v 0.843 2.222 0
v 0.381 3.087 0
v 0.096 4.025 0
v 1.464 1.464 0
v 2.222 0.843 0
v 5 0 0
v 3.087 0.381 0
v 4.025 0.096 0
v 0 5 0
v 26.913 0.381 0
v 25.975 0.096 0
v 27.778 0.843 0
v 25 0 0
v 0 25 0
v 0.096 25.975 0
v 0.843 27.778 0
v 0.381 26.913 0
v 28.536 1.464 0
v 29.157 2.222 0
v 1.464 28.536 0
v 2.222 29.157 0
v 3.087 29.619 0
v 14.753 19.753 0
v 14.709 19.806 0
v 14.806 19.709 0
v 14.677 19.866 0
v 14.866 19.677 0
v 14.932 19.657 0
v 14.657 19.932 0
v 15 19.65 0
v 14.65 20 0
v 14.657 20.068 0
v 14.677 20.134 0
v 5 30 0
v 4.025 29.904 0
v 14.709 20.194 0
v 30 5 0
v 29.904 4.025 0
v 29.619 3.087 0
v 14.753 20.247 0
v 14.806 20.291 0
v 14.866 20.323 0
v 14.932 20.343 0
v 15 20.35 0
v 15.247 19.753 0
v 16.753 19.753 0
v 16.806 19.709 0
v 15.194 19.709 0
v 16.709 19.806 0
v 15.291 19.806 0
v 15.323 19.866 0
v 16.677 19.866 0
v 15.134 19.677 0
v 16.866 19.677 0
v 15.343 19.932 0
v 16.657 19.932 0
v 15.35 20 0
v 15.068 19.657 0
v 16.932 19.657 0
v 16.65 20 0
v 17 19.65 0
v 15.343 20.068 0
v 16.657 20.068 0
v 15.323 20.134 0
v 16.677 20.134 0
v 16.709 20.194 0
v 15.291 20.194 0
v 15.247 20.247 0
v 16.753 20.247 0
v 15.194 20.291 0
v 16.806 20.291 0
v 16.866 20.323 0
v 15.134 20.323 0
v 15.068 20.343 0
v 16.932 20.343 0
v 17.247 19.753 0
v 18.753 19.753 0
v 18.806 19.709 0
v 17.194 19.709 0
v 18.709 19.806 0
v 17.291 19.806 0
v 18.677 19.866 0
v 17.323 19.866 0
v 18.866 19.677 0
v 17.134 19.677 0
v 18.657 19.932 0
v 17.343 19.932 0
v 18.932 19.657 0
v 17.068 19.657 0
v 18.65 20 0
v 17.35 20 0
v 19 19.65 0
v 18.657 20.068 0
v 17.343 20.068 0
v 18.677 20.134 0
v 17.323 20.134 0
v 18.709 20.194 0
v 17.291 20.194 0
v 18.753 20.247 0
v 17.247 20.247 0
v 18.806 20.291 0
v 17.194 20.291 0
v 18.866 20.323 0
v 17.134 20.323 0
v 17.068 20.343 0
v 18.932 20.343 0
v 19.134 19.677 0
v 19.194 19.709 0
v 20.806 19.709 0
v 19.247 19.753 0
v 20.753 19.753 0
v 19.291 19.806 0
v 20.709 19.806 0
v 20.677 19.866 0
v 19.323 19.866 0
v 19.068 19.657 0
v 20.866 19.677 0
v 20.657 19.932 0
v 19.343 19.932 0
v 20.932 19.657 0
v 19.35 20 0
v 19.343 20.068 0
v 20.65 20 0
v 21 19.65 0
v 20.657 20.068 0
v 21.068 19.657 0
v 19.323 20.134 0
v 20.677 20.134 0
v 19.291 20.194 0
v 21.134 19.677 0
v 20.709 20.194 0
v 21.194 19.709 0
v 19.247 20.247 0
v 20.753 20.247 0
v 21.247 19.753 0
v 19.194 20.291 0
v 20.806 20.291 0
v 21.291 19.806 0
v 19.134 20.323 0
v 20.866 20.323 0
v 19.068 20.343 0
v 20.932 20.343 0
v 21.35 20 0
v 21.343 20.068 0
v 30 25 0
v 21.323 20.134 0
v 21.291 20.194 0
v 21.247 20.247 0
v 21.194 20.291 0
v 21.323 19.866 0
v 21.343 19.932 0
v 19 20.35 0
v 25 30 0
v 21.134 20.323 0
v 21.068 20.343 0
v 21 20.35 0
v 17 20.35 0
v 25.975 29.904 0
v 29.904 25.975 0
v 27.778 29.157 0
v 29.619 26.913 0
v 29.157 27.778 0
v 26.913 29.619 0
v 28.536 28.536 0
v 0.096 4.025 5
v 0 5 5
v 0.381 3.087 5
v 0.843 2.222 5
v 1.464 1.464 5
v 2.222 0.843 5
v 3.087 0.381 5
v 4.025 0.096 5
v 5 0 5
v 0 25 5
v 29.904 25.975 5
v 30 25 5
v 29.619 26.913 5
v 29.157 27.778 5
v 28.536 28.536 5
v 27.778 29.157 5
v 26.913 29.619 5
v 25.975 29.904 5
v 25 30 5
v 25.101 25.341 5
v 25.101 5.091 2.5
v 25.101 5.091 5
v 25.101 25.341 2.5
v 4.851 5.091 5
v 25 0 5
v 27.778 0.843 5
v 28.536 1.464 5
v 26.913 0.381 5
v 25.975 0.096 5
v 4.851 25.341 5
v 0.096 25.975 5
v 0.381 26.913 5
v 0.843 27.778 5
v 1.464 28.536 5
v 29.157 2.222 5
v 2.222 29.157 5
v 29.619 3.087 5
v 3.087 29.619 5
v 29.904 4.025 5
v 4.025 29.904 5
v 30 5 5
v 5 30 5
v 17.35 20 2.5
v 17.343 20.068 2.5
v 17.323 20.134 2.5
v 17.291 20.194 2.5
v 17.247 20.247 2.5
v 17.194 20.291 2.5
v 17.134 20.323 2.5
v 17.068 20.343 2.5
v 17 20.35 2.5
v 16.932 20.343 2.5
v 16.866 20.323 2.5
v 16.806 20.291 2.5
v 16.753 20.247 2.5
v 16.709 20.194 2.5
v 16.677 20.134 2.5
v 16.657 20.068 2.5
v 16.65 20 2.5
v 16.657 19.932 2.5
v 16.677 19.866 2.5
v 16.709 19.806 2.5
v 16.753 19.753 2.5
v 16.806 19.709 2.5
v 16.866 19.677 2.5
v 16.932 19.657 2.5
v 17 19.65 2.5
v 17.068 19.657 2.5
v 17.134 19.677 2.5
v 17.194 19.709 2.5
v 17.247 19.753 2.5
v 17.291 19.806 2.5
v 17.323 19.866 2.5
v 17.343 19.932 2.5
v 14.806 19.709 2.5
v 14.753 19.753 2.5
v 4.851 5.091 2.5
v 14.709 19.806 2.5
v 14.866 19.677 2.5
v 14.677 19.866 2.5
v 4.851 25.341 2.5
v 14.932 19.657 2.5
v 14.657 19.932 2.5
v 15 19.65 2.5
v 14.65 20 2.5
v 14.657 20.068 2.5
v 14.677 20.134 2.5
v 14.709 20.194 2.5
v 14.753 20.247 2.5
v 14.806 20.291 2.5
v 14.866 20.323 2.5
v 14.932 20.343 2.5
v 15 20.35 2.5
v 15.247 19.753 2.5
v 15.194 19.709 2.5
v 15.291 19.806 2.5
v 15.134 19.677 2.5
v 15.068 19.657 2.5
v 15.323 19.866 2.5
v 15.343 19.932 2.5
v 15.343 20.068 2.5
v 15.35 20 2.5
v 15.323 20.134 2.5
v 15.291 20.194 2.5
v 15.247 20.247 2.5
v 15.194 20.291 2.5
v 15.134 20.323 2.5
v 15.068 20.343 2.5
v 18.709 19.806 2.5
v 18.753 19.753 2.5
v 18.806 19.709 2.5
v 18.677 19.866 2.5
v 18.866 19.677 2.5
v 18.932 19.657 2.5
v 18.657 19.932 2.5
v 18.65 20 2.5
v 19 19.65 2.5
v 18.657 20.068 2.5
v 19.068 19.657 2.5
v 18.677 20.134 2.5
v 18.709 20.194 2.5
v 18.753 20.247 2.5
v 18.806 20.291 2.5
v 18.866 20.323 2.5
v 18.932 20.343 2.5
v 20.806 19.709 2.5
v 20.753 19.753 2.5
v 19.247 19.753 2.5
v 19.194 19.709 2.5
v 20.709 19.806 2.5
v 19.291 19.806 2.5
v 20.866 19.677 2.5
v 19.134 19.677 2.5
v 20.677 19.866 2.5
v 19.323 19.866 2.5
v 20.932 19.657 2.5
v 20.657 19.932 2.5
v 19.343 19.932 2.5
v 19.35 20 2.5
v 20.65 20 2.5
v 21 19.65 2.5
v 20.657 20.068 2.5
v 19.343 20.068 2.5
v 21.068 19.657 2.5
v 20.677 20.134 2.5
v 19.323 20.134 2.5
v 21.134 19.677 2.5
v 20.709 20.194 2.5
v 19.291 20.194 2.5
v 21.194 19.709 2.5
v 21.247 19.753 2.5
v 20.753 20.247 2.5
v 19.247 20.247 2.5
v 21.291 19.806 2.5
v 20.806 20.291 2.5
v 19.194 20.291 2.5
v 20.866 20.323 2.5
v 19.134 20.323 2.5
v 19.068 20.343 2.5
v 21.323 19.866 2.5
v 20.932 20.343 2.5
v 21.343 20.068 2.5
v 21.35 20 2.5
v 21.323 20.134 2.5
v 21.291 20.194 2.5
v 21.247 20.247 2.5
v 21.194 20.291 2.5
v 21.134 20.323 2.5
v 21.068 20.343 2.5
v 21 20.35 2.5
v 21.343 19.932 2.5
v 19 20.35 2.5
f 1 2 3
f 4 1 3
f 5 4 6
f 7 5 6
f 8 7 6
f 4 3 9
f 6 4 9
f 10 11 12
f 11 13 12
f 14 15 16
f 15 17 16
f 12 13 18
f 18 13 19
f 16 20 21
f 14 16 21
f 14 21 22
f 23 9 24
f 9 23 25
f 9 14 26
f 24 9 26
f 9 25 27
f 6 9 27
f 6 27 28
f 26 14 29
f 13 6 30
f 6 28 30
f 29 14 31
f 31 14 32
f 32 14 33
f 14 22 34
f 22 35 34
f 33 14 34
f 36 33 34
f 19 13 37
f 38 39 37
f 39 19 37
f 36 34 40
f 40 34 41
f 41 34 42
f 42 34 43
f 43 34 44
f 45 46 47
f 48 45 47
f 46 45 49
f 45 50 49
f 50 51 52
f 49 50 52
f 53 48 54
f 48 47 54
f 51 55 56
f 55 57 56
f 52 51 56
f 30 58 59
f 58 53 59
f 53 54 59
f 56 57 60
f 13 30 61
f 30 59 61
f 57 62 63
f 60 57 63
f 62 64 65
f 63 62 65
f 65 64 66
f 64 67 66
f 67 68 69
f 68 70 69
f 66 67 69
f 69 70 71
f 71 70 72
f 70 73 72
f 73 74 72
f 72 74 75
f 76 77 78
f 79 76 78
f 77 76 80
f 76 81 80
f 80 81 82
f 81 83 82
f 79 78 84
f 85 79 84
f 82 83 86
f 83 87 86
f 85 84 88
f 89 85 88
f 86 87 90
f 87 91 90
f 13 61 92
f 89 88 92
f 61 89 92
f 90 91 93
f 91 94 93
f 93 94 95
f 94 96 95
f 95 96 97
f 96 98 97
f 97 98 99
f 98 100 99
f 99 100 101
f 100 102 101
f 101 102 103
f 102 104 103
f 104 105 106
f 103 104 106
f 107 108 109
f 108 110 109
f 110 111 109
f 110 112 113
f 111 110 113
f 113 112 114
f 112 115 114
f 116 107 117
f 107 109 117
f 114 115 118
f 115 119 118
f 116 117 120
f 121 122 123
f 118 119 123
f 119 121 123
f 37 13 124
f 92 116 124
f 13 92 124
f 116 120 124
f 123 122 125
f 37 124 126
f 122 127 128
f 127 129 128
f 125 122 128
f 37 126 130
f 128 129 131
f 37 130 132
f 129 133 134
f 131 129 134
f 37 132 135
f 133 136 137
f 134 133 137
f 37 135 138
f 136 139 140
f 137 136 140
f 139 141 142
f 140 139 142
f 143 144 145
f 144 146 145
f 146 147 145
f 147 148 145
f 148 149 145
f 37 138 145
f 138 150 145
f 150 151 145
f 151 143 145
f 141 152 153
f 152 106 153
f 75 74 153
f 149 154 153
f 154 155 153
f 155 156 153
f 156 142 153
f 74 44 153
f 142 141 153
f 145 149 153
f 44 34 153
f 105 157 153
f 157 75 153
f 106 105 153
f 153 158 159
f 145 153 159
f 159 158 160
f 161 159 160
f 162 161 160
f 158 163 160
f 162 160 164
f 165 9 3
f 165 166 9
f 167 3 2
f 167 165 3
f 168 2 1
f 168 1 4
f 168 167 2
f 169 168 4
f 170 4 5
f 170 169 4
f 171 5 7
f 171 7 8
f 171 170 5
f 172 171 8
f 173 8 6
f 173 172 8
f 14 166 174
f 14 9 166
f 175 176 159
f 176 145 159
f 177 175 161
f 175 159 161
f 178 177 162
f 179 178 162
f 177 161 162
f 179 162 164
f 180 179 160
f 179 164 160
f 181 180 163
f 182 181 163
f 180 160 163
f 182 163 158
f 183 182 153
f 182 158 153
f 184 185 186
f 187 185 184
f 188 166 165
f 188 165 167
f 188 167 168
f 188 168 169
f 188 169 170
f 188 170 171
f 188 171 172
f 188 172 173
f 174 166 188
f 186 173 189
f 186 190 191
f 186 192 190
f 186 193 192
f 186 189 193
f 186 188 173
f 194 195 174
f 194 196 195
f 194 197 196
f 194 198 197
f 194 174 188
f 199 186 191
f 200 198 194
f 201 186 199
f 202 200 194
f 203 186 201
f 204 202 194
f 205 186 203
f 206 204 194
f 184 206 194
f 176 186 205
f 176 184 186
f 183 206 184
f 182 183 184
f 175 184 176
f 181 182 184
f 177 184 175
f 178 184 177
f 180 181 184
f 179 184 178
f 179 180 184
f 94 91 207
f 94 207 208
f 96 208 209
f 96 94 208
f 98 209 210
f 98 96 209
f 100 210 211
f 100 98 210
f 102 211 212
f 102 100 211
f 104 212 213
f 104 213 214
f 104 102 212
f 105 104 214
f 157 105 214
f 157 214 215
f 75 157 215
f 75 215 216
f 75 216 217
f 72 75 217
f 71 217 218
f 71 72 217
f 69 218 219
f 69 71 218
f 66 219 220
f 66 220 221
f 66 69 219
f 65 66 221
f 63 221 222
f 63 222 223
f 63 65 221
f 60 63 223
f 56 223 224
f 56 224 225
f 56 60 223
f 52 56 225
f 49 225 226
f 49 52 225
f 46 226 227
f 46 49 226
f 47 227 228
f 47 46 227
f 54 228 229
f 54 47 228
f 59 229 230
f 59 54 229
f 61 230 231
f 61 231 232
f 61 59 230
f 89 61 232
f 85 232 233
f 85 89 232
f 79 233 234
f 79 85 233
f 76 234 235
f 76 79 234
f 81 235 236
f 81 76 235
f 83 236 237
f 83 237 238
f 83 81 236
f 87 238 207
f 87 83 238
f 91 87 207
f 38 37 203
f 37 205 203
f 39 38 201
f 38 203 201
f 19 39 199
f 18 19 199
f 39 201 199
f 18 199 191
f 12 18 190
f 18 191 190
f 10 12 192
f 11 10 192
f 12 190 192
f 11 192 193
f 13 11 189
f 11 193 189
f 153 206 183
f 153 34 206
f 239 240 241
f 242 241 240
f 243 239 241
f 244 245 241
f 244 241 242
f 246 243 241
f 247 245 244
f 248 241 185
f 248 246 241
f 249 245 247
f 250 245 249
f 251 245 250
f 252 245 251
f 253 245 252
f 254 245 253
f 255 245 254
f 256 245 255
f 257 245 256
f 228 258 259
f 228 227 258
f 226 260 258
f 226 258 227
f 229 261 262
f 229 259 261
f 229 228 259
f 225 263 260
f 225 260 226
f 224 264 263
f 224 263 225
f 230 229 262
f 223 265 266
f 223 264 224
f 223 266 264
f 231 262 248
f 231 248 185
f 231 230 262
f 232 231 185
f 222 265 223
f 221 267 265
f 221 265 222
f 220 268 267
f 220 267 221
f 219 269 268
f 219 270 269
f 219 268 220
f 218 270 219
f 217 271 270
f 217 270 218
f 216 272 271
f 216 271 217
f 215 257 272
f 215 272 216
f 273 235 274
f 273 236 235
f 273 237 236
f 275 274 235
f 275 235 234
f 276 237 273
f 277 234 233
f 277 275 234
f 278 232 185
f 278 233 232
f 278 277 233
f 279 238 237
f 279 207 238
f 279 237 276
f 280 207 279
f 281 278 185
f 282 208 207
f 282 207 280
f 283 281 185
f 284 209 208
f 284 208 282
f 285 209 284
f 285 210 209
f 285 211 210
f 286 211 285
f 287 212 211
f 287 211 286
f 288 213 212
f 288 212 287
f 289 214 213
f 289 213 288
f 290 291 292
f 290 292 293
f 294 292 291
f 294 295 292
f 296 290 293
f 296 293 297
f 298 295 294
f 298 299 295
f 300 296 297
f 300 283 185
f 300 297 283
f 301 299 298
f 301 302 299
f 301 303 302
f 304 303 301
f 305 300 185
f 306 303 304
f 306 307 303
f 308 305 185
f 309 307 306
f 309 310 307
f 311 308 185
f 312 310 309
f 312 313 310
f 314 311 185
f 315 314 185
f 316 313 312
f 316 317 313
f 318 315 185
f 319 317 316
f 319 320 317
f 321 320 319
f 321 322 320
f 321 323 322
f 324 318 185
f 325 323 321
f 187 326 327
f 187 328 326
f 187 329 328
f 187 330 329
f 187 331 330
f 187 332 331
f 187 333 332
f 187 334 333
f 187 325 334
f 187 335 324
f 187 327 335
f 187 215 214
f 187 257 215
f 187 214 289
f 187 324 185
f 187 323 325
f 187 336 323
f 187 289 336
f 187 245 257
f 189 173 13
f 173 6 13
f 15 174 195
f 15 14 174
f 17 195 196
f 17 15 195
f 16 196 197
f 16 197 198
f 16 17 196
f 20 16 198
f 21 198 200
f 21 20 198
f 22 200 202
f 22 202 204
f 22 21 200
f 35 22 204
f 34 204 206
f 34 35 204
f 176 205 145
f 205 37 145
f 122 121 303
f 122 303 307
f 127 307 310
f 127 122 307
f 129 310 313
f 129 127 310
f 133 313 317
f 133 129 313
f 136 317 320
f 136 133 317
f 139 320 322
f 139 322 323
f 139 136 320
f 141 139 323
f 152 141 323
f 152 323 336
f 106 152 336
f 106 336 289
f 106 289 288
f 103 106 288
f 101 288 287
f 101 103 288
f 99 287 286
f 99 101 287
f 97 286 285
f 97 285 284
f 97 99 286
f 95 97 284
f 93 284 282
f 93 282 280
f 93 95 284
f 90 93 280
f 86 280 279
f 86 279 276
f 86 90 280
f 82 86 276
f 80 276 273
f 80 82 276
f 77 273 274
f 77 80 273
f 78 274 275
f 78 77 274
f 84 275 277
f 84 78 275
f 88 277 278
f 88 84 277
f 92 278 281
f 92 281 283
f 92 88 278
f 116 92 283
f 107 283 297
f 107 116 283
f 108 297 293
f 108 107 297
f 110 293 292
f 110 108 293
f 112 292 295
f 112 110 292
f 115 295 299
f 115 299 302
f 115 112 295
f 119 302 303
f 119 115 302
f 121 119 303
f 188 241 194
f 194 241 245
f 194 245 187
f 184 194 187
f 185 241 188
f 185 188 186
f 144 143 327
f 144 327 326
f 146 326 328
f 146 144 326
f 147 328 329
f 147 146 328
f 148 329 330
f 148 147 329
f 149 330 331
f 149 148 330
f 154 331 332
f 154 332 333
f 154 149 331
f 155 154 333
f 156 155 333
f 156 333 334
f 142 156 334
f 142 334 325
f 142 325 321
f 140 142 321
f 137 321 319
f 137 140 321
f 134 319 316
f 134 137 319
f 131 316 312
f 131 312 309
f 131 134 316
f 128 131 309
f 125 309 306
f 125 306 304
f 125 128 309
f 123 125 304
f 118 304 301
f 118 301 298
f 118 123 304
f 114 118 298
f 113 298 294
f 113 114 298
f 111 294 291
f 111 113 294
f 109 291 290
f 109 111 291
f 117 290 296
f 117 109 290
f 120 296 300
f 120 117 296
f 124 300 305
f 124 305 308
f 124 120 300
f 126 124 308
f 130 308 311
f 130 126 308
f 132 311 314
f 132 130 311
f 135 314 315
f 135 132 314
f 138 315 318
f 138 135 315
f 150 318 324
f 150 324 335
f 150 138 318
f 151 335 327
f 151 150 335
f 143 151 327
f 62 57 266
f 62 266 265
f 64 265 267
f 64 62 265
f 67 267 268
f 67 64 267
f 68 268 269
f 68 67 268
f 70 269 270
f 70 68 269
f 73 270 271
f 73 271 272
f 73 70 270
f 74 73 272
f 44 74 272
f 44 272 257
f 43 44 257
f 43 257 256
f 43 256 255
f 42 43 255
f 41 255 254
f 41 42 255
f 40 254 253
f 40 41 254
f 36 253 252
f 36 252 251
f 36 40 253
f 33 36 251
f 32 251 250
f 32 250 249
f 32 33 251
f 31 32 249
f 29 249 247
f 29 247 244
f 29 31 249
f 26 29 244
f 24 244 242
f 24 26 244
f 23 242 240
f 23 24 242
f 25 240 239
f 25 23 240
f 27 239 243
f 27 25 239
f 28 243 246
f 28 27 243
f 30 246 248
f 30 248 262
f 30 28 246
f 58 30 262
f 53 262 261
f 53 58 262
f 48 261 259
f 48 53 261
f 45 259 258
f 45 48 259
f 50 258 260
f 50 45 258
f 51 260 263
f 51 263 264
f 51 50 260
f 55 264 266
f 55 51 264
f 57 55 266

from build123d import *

# Parameters (mm, degrees)
F0_W     = 30
F0_H     = 30
F0_R     = 0.35
F1_DEPTH = 2.5
F2_W     = 30
F2_H     = 30
F2_W_2   = 20.25
F2_H_2   = 20.25
F3_DEPTH = 5
F4_R     = 5


with BuildPart() as f1:
    # F0 (on Top) → F1 (new body)
    with BuildSketch(Plane.XY):
        with Locations((15, 15)):
            Rectangle(F0_W, F0_H)
        with Locations((15, 20)):
            Circle(F0_R, mode=Mode.SUBTRACT)
        with Locations((17, 20)):
            Circle(F0_R, mode=Mode.SUBTRACT)
        with Locations((19, 20)):
            Circle(F0_R, mode=Mode.SUBTRACT)
        with Locations((21, 20)):
            Circle(F0_R, mode=Mode.SUBTRACT)
    extrude(amount=F1_DEPTH)

    # F2 (on Top) → F3 (join)
    with BuildSketch(Plane.XY):
        with Locations((15, 15)):
            Rectangle(F2_W, F2_H)
        with Locations((14.976355, 15.216224)):
            Rectangle(F2_W_2, F2_H_2, mode=Mode.SUBTRACT)
    extrude(amount=F3_DEPTH)

    # F4
    f4_edges = [f1.edges().sort_by_distance(p)[0] for p in [
        (0, 30, 2.5),
        (0, 0, 2.5),
        (30, 30, 2.5),
        (30, 0, 2.5),
    ]]
    fillet(f4_edges, radius=F4_R)


solid = f1.part
